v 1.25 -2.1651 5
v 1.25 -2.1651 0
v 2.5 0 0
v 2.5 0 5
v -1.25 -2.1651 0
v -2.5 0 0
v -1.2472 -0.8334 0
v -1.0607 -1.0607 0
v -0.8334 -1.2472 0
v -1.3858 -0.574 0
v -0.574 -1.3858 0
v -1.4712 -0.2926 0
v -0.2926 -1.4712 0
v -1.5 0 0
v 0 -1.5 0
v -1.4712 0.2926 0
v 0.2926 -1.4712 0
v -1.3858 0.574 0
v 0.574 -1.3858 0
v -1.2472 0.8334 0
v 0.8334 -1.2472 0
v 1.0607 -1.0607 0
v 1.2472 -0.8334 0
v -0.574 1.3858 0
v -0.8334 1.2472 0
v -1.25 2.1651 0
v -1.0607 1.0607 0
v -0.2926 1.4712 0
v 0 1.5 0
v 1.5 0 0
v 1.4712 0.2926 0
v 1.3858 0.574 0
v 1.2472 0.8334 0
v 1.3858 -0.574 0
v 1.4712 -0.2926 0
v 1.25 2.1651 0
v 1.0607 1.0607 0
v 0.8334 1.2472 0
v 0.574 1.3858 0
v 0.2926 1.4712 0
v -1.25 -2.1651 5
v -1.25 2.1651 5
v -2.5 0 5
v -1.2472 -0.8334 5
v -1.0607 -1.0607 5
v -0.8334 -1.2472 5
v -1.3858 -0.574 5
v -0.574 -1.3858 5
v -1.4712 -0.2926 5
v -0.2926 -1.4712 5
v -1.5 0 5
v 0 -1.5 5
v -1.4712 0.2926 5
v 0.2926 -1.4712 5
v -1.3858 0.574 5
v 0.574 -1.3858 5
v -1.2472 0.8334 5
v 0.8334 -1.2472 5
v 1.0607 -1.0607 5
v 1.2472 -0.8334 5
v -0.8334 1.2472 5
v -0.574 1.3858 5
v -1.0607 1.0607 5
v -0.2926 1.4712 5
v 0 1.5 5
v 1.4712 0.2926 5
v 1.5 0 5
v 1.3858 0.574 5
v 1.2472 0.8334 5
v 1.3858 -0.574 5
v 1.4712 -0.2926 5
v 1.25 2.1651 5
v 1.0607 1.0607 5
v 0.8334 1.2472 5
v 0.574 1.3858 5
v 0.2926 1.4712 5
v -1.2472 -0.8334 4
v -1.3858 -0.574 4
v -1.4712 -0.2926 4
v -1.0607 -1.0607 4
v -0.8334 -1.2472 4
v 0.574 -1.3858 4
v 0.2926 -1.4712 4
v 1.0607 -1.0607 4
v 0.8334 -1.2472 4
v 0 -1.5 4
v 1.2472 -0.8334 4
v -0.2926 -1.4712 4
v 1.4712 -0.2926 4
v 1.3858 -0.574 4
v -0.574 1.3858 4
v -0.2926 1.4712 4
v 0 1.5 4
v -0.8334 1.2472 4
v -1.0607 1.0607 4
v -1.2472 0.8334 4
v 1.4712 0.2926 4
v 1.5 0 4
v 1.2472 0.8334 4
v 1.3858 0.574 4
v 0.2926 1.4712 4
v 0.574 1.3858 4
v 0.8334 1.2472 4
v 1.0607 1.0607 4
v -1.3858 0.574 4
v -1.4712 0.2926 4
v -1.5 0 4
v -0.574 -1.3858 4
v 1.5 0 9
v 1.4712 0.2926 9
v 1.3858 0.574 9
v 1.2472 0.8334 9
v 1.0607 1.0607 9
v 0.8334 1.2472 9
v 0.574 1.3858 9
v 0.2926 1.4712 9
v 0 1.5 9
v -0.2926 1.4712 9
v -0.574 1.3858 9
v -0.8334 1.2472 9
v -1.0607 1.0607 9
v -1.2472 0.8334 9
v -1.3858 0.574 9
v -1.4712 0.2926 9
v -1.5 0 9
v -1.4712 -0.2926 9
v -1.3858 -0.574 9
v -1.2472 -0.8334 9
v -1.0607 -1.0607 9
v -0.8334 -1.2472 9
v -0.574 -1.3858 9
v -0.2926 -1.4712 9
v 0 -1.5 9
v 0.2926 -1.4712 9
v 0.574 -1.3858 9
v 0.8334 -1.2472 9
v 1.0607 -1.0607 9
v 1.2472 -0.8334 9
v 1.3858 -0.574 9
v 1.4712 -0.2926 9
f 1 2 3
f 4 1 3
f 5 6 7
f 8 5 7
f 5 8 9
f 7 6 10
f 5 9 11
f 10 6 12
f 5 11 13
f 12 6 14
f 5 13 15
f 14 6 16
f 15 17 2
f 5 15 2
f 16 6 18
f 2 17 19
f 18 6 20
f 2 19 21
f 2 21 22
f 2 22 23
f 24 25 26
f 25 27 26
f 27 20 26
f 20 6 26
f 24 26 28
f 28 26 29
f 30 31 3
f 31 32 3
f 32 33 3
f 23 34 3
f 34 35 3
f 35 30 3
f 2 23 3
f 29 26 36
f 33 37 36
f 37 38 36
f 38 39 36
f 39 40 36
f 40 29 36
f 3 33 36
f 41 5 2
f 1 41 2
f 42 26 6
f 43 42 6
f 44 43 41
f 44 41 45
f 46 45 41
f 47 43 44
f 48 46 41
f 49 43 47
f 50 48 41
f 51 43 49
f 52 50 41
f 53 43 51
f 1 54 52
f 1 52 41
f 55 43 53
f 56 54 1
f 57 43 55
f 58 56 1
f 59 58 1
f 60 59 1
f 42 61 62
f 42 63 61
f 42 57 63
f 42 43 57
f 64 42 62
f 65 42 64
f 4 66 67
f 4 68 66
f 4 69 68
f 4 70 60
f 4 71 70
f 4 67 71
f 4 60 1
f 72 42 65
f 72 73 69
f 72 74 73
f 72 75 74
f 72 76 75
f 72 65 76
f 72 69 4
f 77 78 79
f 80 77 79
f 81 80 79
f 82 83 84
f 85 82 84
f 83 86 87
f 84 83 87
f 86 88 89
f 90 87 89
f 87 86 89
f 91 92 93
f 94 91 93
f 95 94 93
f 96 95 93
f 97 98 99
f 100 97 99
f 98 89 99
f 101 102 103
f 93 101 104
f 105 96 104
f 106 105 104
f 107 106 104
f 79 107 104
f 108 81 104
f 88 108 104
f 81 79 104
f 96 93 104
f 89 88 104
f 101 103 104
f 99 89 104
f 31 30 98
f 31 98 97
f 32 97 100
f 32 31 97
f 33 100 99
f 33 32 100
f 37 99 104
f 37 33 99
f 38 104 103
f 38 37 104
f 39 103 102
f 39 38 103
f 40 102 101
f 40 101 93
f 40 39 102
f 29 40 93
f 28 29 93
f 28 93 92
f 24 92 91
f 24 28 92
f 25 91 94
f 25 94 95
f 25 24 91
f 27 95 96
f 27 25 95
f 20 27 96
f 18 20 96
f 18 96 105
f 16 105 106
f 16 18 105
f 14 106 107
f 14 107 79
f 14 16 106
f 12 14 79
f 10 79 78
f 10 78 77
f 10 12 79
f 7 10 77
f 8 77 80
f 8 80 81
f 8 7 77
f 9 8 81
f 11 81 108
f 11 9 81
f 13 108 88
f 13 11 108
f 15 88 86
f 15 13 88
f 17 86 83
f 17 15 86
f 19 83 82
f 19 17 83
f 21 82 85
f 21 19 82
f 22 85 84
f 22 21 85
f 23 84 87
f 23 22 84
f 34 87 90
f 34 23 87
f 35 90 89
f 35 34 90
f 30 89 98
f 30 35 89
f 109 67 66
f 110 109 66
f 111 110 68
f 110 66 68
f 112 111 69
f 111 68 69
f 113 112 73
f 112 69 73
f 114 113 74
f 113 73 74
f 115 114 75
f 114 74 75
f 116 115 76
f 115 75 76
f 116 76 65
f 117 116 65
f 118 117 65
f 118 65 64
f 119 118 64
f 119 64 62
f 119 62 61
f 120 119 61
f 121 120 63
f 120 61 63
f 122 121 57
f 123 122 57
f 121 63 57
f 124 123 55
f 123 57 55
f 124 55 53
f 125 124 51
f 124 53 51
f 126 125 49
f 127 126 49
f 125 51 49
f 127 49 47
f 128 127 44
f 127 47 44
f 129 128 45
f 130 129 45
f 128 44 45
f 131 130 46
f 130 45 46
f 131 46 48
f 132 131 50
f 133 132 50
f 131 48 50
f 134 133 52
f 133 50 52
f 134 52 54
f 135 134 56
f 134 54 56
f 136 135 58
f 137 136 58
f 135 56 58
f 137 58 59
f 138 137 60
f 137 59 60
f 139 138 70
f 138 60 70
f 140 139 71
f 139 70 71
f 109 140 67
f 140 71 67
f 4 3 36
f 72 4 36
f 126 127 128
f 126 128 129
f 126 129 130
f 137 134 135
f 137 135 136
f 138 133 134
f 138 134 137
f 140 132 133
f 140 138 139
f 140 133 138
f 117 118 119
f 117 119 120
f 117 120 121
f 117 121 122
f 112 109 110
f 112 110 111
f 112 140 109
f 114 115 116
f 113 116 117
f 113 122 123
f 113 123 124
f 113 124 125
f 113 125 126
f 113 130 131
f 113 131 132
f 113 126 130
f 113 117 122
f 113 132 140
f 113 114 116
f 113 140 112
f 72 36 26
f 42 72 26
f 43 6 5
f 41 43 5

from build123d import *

# Parameters (mm, degrees)
F1_DEPTH = 5
F2_R     = 1.5
F3_DEPTH = 4
F4_R     = 1.5
F5_DEPTH = 4


with BuildPart() as f1:
    # F0 (on Top) → F1 (new body)
    with BuildSketch(Plane.XY):
        Polygon((1.25, -2.165064), (2.5, 0), (1.25, 2.165064), (-1.25, 2.165064), (-2.5, 0), (-1.25, -2.165064), align=None)
    extrude(amount=F1_DEPTH)

    # F2 (on face) → F3 (join)
    with BuildSketch(Plane.XY.offset(5)):
        Circle(F2_R)
    extrude(amount=F3_DEPTH)

    # F4 (on face) → F5 (cut)
    with BuildSketch(Plane.XY):
        Circle(F4_R)
    extrude(amount=F5_DEPTH, mode=Mode.SUBTRACT)


solid = f1.part
